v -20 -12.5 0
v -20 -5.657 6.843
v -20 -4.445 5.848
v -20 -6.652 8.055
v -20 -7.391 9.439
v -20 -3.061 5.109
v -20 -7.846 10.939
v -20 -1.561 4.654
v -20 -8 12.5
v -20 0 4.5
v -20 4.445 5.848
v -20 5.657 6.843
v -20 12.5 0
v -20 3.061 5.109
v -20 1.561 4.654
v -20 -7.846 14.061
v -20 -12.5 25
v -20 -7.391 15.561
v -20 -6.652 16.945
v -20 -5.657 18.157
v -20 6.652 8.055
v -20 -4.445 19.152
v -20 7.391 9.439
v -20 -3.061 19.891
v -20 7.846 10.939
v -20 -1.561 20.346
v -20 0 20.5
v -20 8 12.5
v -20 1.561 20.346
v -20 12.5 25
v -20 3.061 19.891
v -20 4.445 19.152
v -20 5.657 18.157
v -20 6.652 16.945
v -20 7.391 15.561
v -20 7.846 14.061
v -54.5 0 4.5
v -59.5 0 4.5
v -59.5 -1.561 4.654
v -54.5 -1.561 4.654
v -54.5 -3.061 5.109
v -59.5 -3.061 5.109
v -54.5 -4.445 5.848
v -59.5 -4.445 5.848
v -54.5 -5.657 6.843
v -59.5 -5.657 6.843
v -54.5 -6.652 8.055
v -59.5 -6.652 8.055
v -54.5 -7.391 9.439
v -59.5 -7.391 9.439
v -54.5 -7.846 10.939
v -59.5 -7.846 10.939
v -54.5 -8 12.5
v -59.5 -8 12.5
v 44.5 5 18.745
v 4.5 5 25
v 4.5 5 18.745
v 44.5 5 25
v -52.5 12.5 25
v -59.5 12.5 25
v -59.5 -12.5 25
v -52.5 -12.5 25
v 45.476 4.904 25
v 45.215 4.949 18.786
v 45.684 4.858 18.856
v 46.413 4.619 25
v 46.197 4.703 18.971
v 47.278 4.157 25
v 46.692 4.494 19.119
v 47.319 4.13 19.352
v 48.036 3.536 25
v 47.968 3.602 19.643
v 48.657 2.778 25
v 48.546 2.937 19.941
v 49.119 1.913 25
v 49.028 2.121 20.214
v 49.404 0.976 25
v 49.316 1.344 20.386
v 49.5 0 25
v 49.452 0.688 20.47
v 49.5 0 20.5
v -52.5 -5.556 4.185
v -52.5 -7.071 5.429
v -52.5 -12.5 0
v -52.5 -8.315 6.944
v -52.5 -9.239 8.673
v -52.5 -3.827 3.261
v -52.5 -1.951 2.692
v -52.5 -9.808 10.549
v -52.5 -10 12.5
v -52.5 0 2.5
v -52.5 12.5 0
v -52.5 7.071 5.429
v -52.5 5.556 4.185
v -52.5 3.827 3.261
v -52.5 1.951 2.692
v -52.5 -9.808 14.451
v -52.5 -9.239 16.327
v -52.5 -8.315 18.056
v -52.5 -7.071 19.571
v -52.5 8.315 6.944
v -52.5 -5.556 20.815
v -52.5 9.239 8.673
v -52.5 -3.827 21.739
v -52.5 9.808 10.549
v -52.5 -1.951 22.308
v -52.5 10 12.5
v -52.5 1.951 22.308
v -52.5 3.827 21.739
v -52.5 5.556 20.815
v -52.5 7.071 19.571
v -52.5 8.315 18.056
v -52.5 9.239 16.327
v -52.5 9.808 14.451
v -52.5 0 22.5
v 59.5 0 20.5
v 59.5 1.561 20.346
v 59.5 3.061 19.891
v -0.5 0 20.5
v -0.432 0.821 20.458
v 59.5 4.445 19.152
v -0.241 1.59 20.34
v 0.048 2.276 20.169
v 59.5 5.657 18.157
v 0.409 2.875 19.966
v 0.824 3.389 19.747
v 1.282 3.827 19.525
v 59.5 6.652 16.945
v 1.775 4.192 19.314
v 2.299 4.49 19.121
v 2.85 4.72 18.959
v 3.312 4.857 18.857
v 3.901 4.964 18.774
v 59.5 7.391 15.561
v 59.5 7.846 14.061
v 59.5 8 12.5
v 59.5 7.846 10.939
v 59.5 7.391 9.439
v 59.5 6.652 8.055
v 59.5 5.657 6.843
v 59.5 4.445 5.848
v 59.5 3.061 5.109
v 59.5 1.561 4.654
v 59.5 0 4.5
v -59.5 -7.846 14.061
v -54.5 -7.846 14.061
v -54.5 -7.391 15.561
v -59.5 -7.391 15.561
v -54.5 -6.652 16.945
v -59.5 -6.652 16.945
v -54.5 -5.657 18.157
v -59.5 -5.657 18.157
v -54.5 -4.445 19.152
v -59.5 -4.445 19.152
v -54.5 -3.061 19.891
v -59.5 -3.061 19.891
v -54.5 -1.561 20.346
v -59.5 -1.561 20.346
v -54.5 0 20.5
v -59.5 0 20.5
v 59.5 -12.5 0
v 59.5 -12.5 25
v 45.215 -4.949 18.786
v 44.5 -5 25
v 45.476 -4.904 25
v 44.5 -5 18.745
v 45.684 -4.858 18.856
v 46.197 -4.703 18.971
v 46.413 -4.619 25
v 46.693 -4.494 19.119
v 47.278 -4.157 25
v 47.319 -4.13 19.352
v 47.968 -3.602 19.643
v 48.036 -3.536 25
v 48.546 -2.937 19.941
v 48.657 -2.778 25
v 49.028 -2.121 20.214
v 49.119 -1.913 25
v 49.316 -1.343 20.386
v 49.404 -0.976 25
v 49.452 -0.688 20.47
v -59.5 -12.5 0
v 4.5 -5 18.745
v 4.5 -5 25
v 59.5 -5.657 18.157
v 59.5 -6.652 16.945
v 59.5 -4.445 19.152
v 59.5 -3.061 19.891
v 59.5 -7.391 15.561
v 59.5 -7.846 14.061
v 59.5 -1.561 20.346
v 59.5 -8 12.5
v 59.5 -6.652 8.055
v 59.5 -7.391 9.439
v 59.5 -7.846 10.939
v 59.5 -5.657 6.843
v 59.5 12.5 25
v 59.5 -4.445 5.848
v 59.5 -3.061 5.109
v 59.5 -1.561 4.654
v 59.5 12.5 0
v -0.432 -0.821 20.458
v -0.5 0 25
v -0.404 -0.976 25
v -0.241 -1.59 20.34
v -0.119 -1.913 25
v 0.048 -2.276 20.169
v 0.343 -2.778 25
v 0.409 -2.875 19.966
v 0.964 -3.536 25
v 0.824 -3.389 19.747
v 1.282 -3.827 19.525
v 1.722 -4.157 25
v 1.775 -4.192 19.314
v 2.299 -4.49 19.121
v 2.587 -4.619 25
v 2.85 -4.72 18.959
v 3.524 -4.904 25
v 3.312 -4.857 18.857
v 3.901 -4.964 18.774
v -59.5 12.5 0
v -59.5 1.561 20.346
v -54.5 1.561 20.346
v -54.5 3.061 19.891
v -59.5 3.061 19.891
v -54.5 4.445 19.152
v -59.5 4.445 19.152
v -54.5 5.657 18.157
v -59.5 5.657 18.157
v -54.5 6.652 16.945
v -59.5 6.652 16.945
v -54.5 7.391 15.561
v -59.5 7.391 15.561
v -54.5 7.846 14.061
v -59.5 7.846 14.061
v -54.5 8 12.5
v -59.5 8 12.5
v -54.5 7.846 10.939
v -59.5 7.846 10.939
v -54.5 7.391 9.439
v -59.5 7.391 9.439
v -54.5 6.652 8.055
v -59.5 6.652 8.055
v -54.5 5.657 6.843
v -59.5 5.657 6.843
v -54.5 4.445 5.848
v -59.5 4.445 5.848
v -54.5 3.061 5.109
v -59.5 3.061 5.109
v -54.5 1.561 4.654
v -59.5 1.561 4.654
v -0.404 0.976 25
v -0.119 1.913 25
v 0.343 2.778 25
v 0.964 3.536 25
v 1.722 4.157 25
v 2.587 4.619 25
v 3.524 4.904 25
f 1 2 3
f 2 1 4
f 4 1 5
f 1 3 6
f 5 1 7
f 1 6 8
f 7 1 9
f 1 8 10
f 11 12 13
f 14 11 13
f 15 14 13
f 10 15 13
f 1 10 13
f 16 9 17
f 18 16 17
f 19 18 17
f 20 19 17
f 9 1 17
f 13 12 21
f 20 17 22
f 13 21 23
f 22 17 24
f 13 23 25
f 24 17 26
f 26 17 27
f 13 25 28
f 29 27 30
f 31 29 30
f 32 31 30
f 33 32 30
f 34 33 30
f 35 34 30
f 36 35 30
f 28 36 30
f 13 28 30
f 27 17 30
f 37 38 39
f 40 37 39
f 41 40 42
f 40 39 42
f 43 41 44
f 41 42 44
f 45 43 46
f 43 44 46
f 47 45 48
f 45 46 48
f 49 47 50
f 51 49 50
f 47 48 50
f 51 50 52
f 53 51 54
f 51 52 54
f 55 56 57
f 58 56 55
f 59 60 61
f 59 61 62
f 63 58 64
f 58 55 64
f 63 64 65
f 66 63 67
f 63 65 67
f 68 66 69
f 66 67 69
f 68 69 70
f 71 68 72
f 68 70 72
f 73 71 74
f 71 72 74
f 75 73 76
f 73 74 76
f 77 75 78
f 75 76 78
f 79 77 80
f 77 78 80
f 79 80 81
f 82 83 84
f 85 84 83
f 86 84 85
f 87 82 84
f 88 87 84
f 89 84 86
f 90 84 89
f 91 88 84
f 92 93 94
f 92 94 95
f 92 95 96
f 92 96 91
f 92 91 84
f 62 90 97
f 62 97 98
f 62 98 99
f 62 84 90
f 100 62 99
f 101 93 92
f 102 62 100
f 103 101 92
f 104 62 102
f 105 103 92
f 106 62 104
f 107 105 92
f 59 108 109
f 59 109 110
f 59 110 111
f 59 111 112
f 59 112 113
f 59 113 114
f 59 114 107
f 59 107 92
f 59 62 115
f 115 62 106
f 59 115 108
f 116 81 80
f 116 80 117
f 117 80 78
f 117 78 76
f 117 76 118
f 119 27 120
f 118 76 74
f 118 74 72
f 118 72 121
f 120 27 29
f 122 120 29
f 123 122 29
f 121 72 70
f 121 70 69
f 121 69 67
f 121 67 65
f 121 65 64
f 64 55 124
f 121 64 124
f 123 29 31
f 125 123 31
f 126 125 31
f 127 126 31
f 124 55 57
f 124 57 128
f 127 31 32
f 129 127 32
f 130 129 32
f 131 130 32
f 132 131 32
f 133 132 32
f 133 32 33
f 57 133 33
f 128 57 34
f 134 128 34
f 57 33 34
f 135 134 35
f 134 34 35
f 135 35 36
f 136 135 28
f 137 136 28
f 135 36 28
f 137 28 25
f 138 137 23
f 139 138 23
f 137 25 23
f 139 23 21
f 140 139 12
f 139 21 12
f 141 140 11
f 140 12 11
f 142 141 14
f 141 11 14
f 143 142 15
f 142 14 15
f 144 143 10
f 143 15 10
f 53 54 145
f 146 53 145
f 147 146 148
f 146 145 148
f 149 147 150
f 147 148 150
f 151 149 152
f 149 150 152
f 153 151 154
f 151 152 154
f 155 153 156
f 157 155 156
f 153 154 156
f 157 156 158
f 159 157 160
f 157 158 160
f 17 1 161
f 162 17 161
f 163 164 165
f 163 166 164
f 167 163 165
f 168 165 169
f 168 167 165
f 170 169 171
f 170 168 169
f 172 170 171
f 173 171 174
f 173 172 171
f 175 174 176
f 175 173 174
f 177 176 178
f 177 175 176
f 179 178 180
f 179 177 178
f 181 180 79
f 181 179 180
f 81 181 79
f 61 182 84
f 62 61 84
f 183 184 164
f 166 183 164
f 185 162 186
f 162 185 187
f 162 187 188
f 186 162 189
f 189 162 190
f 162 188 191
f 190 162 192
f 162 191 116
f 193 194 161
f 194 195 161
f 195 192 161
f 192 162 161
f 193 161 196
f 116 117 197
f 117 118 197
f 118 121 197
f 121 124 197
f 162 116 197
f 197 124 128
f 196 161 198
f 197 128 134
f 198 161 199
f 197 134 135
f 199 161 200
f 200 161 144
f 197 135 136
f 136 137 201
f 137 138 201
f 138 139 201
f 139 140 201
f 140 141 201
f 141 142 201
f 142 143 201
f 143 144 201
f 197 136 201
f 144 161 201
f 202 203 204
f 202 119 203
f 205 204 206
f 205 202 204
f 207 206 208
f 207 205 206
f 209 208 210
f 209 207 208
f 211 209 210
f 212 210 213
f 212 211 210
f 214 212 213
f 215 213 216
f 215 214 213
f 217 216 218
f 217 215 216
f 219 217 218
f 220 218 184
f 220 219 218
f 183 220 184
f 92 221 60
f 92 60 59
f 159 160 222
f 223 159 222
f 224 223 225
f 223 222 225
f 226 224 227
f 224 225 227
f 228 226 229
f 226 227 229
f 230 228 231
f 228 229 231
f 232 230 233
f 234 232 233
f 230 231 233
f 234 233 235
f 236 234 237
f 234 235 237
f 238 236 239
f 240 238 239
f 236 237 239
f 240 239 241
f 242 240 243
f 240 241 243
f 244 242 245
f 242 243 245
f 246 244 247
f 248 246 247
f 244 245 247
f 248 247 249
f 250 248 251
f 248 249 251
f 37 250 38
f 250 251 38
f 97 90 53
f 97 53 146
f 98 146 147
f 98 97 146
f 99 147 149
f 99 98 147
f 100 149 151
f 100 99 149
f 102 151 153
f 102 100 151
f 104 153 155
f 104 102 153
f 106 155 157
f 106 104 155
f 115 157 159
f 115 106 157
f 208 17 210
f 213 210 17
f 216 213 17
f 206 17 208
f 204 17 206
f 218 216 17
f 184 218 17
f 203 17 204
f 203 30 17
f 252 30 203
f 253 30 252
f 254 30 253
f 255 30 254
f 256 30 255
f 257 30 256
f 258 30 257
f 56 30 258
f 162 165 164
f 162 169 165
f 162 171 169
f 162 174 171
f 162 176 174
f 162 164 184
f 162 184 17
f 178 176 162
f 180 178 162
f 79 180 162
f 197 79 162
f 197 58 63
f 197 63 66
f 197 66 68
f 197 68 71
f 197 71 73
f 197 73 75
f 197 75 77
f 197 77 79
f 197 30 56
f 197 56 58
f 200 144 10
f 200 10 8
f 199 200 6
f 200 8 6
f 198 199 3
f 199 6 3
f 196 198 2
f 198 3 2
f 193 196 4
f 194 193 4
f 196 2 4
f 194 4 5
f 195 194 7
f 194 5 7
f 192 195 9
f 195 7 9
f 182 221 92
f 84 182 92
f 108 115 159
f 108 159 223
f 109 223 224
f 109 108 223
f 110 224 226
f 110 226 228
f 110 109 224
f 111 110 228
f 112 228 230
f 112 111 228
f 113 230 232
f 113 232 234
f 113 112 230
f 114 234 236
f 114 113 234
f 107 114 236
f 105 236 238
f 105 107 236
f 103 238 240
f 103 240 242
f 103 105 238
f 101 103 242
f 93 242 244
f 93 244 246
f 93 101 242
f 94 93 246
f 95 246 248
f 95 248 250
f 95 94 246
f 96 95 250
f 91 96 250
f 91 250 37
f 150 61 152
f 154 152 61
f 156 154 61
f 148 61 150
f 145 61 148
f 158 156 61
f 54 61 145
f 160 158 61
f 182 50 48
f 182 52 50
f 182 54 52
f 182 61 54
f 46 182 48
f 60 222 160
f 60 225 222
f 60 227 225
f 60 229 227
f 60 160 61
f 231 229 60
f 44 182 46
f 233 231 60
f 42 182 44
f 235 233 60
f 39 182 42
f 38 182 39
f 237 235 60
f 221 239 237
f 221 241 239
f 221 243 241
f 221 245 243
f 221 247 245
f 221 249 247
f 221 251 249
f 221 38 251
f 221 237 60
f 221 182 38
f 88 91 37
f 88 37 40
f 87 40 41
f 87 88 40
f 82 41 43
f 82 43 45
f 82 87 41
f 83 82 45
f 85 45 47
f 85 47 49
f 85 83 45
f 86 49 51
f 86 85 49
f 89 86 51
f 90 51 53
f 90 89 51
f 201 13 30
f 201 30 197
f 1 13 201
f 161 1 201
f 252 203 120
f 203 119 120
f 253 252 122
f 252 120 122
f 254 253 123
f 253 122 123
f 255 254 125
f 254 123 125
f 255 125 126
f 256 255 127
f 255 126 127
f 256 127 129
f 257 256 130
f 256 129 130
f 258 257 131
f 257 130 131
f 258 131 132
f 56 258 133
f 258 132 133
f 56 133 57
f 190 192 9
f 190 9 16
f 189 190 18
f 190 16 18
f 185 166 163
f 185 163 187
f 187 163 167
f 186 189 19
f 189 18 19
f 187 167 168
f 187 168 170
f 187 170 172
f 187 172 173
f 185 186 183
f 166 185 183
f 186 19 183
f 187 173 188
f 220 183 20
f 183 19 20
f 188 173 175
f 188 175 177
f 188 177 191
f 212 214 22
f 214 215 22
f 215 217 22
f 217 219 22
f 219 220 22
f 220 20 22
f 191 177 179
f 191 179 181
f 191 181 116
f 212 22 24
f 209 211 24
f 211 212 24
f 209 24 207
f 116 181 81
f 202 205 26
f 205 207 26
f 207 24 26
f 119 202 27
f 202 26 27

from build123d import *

# Parameters (mm, degrees)
F0_W     = 119
F0_H     = 25
F1_DEPTH = 25
F3_DEPTH = 119.001
F4_W     = 32.5
F4_H     = 25
F5_DEPTH = 25.001
F6_SIZE  = 2
F7_W     = 50
F7_H     = 5
F8_DEPTH = 10
F9_R     = 4.9999
F10_R    = 4.9999


# Not quite as in the source:
# - a fillet or chamfer is up to 0.001 mm smaller than in the source, because OpenCascade refuses the exact size


with BuildPart() as f1:
    # F0 (on Top) → F1 (new body)
    with BuildSketch(Plane.XY):
        Rectangle(F0_W, F0_H)
    extrude(amount=F1_DEPTH)

    # F2 (on face) → F3 (cut, through all)
    with BuildSketch(Plane(origin=(-59.5, 0, 0), x_dir=(0, -1, 0), z_dir=(-1, 0, 0))):
        with BuildLine():
            ThreePointArc((8, 12.5), (5.6568542495, 18.1568542495), (0, 20.5))
            Line((0, 20.5), (0, 4.5))
            ThreePointArc((0, 4.5), (5.6568542495, 6.8431457505), (8, 12.5))
        make_face()
        with BuildLine():
            Line((0, 4.5), (0, 20.5))
            ThreePointArc((0, 20.5), (-8, 12.5), (0, 4.5))
        make_face()
    extrude(amount=-F3_DEPTH, mode=Mode.SUBTRACT)

    # F4 (on face) → F5 (cut, through all)
    with BuildSketch(Plane.XY.offset(25)):
        with Locations((-36.25, 0)):
            Rectangle(F4_W, F4_H)
    extrude(amount=-F5_DEPTH, mode=Mode.SUBTRACT)

    # F6
    f6_edges = [f1.edges().sort_by_distance(p)[0] for p in [
        (-52.5, 8, 12.5),
    ]]
    chamfer(f6_edges, length=F6_SIZE)

    # F7 (on face) → F8 (cut)
    with BuildSketch(Plane.XY.offset(25)):
        with Locations((24.5, 2.5)):
            Rectangle(F7_W, F7_H)
        with Locations((24.5, -2.5)):
            Rectangle(F7_W, F7_H)
    extrude(amount=-F8_DEPTH, mode=Mode.SUBTRACT)

    # F9 (radius 5 in the source; OpenCascade refuses exactly that, so slightly less here)
    f9_edges = [f1.edges().sort_by_distance(p)[0] for p in [
        (-0.5, 5, 21.872499),
        (-0.5, -5, 21.872499),
    ]]
    fillet(f9_edges, radius=F9_R)

    # F10 (radius 5 in the source; OpenCascade refuses exactly that, so slightly less here)
    f10_edges = [f1.edges().sort_by_distance(p)[0] for p in [
        (49.5, 5, 21.872499),
        (49.5, -5, 21.872499),
    ]]
    fillet(f10_edges, radius=F10_R)


solid = f1.part
